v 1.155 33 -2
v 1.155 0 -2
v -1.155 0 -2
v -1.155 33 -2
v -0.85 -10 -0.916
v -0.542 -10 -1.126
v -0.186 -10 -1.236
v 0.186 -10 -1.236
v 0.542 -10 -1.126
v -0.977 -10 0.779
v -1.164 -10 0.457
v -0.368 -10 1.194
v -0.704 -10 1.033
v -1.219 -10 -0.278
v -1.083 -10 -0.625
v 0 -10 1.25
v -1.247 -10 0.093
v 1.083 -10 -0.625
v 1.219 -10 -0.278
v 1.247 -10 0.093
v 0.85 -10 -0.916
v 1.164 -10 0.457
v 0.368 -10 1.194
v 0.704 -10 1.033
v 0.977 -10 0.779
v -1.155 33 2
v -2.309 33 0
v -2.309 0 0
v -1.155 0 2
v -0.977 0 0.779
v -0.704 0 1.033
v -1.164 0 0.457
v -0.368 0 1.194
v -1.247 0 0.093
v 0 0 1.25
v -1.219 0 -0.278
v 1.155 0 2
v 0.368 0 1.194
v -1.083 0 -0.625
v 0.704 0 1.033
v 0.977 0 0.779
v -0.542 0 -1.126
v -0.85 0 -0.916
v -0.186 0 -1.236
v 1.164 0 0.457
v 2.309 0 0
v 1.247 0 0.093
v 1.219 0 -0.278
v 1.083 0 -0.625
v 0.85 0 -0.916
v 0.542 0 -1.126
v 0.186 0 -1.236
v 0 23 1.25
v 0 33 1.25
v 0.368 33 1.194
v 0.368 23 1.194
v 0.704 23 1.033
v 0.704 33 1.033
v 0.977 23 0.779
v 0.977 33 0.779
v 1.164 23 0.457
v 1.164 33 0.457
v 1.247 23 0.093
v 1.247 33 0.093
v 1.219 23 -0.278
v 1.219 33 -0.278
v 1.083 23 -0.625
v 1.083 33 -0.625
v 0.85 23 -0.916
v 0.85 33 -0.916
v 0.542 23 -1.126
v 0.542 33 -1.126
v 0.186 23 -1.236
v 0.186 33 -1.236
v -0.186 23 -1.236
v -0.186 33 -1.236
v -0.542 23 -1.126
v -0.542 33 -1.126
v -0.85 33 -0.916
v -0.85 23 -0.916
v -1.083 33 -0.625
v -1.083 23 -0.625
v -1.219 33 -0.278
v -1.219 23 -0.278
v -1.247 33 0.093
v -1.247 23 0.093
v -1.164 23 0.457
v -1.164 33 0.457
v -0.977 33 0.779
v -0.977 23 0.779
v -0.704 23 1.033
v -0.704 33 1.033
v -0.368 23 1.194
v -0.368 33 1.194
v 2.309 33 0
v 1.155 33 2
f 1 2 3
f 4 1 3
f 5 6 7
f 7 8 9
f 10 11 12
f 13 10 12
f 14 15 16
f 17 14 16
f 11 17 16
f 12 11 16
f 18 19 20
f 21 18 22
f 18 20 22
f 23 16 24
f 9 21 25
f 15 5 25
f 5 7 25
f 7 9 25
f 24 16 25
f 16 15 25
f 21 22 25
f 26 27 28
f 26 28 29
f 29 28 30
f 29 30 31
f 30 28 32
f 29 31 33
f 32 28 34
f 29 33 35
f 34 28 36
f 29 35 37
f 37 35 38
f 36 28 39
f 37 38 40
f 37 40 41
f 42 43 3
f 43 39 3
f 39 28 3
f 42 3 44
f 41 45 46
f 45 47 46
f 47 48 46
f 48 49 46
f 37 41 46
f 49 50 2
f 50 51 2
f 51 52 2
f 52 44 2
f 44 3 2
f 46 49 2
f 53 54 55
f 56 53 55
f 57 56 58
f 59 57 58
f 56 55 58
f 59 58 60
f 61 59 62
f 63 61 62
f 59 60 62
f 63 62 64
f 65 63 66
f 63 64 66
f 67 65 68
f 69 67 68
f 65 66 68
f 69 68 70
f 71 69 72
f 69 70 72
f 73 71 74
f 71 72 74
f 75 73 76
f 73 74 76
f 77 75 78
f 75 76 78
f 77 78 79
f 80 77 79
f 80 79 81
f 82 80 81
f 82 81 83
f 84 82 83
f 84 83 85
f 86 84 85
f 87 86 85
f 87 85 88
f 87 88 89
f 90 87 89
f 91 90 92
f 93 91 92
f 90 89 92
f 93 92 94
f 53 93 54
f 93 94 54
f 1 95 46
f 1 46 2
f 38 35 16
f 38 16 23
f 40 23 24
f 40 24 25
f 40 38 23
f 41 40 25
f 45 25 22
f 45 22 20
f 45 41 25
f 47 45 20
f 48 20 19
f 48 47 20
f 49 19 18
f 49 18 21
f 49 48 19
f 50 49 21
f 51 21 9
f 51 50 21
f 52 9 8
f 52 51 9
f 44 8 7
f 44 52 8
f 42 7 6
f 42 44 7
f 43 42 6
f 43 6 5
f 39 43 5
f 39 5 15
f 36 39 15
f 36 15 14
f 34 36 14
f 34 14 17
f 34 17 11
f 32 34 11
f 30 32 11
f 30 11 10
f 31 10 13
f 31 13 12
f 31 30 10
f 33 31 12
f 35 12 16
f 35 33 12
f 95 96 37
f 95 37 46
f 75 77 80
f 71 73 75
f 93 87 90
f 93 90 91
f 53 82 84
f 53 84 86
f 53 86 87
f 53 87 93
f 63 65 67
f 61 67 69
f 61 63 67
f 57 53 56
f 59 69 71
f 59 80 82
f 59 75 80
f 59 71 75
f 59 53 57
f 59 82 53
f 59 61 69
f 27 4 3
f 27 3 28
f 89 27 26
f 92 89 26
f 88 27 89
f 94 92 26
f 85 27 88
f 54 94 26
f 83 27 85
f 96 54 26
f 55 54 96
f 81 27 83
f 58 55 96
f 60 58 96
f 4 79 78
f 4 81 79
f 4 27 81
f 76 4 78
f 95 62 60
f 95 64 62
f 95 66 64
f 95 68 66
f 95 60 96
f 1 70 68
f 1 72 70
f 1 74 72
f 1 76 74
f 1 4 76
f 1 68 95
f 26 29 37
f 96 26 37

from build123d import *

# Parameters (mm, degrees)
BOSS_EXTRUDE1_DEPTH = 33
SKETCH2_R           = 1.25
BOSS_EXTRUDE2_DEPTH = 10
SKETCH3_R           = 1.25
CUT_EXTRUDE1_DEPTH  = 10


with BuildPart() as part:
    # Sketch1 → Boss-Extrude1 (new body)
    with BuildSketch(Plane(origin=(0, 0, 0), x_dir=(1, 0, 0), z_dir=(0, 1, 0))):
        Polygon((1.154700538, -2), (2.309401077, 0), (1.154700538, 2), (-1.154700538, 2), (-2.309401077, 0), (-1.154700538, -2), align=None)
    extrude(amount=BOSS_EXTRUDE1_DEPTH)

    # Sketch2 → Boss-Extrude2 (add)
    with BuildSketch(Plane(origin=(0, 0, 0), x_dir=(1, 0, 0), z_dir=(0, 1, 0))):
        with Locations(Location((0, 0, 0), (0, 0, 270))):
            Circle(SKETCH2_R)
    extrude(amount=-BOSS_EXTRUDE2_DEPTH)

    # Sketch3 → Cut-Extrude1 (cut)
    with BuildSketch(Plane(origin=(0, 33, 0), x_dir=(1, 0, 0), z_dir=(0, 1, 0))):
        with Locations(Location((0, 0, 0), (0, 0, 270))):
            Circle(SKETCH3_R)
    extrude(amount=-CUT_EXTRUDE1_DEPTH, mode=Mode.SUBTRACT)


solid = part.part
